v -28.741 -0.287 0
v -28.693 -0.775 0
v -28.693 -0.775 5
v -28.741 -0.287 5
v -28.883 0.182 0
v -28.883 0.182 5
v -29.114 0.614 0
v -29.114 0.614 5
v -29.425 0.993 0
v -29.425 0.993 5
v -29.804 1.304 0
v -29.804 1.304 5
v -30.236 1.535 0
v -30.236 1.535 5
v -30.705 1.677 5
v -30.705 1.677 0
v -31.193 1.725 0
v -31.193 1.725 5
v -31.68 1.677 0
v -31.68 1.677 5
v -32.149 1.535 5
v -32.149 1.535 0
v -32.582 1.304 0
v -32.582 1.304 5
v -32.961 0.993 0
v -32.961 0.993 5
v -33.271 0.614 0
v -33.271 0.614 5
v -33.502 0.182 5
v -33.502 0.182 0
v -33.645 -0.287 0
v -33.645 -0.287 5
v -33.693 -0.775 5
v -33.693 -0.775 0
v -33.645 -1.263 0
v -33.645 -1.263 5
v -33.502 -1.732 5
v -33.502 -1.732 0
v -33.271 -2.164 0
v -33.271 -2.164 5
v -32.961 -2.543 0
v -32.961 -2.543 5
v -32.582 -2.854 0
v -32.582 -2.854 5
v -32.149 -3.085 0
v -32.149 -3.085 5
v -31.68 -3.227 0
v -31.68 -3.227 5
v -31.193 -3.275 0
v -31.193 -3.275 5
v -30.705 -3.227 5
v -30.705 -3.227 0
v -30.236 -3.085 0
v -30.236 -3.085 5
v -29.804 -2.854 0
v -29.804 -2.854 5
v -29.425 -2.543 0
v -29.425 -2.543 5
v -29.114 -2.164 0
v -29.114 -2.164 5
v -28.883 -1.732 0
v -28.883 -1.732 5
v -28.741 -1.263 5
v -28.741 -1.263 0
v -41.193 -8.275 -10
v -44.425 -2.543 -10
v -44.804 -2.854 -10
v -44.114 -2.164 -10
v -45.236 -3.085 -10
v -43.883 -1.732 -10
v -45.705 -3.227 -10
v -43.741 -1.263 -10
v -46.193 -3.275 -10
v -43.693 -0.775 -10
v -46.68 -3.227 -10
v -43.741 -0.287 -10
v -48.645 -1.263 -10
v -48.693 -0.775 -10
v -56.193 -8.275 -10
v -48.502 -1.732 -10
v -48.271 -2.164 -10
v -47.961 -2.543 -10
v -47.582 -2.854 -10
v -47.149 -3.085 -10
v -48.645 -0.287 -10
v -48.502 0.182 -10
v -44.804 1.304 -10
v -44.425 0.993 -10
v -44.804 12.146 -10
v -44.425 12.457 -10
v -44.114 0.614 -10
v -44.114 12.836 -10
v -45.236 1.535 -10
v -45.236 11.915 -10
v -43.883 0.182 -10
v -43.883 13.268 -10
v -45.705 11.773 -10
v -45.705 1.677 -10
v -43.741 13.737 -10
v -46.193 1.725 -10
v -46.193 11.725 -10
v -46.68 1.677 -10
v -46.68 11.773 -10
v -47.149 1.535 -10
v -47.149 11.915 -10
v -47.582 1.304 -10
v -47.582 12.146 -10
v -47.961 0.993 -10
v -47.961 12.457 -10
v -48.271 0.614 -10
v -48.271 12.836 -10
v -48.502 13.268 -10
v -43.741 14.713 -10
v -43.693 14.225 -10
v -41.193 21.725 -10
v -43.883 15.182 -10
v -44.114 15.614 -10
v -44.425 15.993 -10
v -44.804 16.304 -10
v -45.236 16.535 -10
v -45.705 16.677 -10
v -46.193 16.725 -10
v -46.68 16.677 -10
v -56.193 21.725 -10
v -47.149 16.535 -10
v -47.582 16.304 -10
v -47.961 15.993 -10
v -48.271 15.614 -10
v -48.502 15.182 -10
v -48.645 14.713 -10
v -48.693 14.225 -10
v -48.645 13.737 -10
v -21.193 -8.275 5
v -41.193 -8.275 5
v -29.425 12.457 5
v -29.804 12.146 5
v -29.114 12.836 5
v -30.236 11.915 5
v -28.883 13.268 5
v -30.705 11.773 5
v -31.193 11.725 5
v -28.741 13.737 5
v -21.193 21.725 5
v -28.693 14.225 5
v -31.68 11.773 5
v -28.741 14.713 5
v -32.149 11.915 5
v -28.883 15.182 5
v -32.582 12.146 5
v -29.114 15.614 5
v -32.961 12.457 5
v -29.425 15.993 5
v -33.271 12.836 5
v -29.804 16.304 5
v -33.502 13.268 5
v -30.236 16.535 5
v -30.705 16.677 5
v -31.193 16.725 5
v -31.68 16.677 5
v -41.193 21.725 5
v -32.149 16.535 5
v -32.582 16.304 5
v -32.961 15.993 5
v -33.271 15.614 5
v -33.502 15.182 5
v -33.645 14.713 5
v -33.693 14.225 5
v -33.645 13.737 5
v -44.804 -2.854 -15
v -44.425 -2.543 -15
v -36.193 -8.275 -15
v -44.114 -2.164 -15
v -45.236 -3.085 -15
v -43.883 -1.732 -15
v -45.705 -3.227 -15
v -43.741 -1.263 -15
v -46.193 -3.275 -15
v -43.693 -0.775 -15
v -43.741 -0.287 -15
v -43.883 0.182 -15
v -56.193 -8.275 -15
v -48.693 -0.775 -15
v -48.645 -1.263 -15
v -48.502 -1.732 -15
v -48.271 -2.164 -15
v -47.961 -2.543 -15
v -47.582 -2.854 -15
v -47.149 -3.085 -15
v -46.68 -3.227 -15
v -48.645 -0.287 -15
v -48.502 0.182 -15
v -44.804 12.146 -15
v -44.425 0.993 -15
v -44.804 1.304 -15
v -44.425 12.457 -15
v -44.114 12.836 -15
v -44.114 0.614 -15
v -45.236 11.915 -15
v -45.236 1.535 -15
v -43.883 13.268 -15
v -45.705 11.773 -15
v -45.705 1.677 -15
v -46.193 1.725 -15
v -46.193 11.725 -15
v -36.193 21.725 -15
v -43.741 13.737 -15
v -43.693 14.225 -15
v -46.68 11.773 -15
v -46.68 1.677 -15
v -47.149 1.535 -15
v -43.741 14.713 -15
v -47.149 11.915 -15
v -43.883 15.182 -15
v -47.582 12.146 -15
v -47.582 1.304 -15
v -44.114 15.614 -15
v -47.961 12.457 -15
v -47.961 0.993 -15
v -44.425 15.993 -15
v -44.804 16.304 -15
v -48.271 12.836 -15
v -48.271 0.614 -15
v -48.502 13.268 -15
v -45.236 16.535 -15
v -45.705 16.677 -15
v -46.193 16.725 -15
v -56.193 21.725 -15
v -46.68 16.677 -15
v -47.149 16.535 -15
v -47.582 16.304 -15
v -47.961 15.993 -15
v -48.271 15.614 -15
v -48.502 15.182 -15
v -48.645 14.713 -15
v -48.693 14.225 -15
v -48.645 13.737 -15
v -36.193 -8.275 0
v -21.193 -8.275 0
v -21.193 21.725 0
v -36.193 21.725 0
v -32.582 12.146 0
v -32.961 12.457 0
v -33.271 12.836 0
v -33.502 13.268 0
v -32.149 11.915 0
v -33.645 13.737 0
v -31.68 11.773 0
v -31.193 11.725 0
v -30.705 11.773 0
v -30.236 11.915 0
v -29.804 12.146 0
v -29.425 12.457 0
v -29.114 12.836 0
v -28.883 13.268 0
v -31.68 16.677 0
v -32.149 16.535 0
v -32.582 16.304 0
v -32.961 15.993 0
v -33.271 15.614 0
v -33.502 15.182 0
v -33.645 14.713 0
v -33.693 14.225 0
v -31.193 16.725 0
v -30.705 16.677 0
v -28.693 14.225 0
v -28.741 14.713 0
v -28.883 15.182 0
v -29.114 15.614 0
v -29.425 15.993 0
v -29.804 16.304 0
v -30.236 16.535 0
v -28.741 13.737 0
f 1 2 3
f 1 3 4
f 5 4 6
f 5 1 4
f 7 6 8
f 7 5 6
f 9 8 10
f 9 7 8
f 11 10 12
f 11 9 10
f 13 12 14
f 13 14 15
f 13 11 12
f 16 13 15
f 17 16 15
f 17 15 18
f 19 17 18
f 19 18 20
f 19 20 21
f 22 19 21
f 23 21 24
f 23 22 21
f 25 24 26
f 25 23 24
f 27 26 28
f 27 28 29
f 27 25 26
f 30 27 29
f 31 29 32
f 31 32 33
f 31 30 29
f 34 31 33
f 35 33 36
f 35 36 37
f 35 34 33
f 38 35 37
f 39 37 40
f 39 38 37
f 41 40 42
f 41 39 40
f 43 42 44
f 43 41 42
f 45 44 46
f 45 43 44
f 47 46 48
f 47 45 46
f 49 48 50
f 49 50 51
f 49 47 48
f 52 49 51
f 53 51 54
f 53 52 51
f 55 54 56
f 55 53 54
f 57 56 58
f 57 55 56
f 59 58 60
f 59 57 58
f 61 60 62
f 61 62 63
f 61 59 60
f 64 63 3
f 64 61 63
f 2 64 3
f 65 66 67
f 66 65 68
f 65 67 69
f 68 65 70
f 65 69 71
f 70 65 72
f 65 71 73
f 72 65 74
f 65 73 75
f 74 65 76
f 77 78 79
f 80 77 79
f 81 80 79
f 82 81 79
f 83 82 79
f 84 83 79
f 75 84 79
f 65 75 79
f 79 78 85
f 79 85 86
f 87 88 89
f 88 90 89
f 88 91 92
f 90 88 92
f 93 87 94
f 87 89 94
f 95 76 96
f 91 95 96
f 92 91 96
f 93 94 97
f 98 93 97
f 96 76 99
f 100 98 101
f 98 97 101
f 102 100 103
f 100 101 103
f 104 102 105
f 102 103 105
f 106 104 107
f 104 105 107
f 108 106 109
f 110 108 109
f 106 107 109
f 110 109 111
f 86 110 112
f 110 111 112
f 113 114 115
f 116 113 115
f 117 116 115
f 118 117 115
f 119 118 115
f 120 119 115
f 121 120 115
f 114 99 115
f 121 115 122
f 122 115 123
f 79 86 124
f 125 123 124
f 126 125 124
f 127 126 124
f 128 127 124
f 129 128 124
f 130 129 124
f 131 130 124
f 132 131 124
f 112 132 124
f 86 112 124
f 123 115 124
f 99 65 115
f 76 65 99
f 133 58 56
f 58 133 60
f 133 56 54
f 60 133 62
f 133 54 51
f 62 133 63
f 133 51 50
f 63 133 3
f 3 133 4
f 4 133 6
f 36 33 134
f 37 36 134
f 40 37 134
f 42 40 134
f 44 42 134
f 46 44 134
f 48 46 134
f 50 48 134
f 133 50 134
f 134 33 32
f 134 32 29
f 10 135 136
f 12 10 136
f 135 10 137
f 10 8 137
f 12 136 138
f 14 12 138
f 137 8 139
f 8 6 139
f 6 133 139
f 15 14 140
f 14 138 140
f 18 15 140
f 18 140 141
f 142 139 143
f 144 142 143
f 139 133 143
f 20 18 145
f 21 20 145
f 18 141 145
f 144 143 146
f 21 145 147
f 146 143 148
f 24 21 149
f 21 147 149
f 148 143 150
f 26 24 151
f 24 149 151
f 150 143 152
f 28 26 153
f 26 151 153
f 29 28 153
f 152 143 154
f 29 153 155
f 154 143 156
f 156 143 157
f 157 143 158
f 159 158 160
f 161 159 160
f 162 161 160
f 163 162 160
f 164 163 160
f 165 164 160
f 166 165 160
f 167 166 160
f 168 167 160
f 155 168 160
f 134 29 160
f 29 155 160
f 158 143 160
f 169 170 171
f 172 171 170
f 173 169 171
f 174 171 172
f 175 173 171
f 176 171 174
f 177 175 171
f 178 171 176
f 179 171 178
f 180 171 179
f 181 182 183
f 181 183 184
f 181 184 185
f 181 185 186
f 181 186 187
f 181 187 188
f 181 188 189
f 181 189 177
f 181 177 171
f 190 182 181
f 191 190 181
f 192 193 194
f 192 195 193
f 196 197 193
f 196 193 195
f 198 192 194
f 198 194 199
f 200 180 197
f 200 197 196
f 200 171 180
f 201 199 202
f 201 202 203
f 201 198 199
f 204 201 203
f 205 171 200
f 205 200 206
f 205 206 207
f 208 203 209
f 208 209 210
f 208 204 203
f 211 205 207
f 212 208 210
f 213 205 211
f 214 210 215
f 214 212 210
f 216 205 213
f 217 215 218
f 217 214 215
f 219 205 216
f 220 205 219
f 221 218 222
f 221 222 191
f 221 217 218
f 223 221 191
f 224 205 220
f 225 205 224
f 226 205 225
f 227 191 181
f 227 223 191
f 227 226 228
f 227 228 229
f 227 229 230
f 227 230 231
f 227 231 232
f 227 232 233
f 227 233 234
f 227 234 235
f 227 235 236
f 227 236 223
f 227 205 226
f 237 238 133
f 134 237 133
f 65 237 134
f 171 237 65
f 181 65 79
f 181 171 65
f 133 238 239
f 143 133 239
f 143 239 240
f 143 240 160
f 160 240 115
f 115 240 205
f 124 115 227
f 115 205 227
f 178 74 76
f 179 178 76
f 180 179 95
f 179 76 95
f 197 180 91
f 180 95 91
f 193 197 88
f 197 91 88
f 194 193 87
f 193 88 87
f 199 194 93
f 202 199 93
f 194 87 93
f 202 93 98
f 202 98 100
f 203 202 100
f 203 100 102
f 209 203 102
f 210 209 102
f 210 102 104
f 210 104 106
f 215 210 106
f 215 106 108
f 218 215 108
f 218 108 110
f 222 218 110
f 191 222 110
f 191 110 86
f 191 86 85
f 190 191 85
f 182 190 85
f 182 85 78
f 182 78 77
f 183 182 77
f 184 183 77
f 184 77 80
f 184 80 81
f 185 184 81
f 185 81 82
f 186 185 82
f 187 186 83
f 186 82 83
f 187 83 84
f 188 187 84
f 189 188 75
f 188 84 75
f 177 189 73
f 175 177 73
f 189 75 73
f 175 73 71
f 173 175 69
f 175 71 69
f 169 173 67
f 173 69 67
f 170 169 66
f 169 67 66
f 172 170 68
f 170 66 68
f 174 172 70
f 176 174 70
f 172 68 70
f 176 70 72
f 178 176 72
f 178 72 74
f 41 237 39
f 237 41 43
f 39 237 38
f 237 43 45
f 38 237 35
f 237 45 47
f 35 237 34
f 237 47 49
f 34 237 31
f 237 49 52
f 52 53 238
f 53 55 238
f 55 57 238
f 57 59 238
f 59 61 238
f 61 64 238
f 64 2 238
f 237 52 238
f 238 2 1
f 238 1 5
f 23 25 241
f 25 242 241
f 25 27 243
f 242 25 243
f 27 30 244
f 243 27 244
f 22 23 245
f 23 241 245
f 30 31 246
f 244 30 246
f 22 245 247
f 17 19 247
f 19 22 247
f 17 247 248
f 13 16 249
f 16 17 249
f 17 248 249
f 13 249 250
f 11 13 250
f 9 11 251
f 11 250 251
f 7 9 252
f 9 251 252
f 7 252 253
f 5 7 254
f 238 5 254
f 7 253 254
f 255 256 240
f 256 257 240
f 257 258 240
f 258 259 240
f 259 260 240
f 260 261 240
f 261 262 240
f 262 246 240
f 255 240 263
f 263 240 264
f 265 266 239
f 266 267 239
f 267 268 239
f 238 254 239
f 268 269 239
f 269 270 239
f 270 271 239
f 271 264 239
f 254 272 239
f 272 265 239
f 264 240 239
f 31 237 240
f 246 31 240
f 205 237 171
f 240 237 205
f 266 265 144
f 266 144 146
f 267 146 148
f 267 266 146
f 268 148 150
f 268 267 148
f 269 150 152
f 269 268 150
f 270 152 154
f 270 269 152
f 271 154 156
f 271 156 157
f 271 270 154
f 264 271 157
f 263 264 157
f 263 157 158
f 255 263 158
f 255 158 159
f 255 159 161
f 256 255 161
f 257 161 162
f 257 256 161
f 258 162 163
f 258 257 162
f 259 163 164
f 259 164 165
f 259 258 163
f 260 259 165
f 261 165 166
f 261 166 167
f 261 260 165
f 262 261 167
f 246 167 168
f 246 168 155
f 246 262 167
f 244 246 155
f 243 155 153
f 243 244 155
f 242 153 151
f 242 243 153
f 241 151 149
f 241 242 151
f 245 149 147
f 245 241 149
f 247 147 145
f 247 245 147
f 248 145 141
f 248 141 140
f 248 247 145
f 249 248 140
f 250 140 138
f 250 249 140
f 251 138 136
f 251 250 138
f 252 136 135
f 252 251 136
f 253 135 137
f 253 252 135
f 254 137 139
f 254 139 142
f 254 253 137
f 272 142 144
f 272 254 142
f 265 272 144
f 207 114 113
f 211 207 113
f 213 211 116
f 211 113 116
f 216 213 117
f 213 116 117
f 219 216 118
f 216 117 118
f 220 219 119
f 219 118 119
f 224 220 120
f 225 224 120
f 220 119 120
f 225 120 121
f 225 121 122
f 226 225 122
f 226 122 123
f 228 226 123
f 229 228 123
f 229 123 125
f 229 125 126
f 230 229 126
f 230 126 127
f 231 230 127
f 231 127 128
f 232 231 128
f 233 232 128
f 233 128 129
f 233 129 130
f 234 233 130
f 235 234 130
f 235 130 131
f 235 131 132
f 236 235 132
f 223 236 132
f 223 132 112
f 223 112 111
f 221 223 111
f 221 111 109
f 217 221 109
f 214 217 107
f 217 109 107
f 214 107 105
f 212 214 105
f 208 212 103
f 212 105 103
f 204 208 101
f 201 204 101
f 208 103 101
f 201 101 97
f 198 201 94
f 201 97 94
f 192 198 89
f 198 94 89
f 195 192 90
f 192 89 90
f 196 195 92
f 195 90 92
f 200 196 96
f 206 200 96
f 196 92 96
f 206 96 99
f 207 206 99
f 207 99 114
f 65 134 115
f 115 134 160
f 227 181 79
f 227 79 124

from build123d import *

# Parameters (mm, degrees)
IZIM1_W                          = 15
IZIM1_H                          = 30
IZIM1_R                          = 2.5
Y_KSEKLIK_EKSTR_ZYON1_DEPTH      = 5
Y_KSEKLIK_EKSTR_ZYON2_DEPTH      = 15
Y_KSEKLIK_EKSTR_ZYON2_DEPTH_BACK = 5
IZIM2_W                          = 5
IZIM2_H                          = 30
IZIM3_W                          = 15
IZIM3_H                          = 30
Y_KSEKLIK_EKSTR_ZYON3_DEPTH      = 5
IZIM4_R                          = 2.5
KES_EKSTR_ZYON1_DEPTH            = 10


with BuildPart() as part:
    # Çizim1 → Yükseklik-Ekstrüzyon1 (new body)
    with BuildSketch(Plane.XY):
        with Locations((-28.692769378, 6.725163294)):
            Rectangle(IZIM1_W, IZIM1_H)
        with Locations((-31.192769378, 14.225163294)):
            Circle(IZIM1_R, mode=Mode.SUBTRACT)
        with Locations((-31.192769378, -0.774836706)):
            Circle(IZIM1_R, mode=Mode.SUBTRACT)
    extrude(amount=Y_KSEKLIK_EKSTR_ZYON1_DEPTH)

    # Çizim2 → Yükseklik-Ekstrüzyon2 (add, two sides: drawn at the far end of the back side and taken through both)
    with BuildSketch(Plane(origin=(0, 0, 0), x_dir=(-1, 0, 0), z_dir=(0, 0, -1)).offset(-Y_KSEKLIK_EKSTR_ZYON2_DEPTH_BACK)):
        with Locations((38.692769378, 6.725163294)):
            Rectangle(IZIM2_W, IZIM2_H)
    extrude(amount=Y_KSEKLIK_EKSTR_ZYON2_DEPTH + Y_KSEKLIK_EKSTR_ZYON2_DEPTH_BACK)

    # Çizim3 → Yükseklik-Ekstrüzyon3 (add)
    with BuildSketch(Plane(origin=(0, 0, -15), x_dir=(-1, 0, 0), z_dir=(0, 0, -1))):
        with Locations((48.692769378, 6.725163294)):
            Rectangle(IZIM3_W, IZIM3_H)
    extrude(amount=-Y_KSEKLIK_EKSTR_ZYON3_DEPTH)

    # Çizim4 → Kes-Ekstrüzyon1 (cut)
    with BuildSketch(Plane.XY.offset(-10)):
        with Locations((-46.192769378, 14.225163294)):
            Circle(IZIM4_R)
        with Locations((-46.192769378, -0.774836706)):
            Circle(IZIM4_R)
    extrude(amount=-KES_EKSTR_ZYON1_DEPTH, mode=Mode.SUBTRACT)


solid = part.part
